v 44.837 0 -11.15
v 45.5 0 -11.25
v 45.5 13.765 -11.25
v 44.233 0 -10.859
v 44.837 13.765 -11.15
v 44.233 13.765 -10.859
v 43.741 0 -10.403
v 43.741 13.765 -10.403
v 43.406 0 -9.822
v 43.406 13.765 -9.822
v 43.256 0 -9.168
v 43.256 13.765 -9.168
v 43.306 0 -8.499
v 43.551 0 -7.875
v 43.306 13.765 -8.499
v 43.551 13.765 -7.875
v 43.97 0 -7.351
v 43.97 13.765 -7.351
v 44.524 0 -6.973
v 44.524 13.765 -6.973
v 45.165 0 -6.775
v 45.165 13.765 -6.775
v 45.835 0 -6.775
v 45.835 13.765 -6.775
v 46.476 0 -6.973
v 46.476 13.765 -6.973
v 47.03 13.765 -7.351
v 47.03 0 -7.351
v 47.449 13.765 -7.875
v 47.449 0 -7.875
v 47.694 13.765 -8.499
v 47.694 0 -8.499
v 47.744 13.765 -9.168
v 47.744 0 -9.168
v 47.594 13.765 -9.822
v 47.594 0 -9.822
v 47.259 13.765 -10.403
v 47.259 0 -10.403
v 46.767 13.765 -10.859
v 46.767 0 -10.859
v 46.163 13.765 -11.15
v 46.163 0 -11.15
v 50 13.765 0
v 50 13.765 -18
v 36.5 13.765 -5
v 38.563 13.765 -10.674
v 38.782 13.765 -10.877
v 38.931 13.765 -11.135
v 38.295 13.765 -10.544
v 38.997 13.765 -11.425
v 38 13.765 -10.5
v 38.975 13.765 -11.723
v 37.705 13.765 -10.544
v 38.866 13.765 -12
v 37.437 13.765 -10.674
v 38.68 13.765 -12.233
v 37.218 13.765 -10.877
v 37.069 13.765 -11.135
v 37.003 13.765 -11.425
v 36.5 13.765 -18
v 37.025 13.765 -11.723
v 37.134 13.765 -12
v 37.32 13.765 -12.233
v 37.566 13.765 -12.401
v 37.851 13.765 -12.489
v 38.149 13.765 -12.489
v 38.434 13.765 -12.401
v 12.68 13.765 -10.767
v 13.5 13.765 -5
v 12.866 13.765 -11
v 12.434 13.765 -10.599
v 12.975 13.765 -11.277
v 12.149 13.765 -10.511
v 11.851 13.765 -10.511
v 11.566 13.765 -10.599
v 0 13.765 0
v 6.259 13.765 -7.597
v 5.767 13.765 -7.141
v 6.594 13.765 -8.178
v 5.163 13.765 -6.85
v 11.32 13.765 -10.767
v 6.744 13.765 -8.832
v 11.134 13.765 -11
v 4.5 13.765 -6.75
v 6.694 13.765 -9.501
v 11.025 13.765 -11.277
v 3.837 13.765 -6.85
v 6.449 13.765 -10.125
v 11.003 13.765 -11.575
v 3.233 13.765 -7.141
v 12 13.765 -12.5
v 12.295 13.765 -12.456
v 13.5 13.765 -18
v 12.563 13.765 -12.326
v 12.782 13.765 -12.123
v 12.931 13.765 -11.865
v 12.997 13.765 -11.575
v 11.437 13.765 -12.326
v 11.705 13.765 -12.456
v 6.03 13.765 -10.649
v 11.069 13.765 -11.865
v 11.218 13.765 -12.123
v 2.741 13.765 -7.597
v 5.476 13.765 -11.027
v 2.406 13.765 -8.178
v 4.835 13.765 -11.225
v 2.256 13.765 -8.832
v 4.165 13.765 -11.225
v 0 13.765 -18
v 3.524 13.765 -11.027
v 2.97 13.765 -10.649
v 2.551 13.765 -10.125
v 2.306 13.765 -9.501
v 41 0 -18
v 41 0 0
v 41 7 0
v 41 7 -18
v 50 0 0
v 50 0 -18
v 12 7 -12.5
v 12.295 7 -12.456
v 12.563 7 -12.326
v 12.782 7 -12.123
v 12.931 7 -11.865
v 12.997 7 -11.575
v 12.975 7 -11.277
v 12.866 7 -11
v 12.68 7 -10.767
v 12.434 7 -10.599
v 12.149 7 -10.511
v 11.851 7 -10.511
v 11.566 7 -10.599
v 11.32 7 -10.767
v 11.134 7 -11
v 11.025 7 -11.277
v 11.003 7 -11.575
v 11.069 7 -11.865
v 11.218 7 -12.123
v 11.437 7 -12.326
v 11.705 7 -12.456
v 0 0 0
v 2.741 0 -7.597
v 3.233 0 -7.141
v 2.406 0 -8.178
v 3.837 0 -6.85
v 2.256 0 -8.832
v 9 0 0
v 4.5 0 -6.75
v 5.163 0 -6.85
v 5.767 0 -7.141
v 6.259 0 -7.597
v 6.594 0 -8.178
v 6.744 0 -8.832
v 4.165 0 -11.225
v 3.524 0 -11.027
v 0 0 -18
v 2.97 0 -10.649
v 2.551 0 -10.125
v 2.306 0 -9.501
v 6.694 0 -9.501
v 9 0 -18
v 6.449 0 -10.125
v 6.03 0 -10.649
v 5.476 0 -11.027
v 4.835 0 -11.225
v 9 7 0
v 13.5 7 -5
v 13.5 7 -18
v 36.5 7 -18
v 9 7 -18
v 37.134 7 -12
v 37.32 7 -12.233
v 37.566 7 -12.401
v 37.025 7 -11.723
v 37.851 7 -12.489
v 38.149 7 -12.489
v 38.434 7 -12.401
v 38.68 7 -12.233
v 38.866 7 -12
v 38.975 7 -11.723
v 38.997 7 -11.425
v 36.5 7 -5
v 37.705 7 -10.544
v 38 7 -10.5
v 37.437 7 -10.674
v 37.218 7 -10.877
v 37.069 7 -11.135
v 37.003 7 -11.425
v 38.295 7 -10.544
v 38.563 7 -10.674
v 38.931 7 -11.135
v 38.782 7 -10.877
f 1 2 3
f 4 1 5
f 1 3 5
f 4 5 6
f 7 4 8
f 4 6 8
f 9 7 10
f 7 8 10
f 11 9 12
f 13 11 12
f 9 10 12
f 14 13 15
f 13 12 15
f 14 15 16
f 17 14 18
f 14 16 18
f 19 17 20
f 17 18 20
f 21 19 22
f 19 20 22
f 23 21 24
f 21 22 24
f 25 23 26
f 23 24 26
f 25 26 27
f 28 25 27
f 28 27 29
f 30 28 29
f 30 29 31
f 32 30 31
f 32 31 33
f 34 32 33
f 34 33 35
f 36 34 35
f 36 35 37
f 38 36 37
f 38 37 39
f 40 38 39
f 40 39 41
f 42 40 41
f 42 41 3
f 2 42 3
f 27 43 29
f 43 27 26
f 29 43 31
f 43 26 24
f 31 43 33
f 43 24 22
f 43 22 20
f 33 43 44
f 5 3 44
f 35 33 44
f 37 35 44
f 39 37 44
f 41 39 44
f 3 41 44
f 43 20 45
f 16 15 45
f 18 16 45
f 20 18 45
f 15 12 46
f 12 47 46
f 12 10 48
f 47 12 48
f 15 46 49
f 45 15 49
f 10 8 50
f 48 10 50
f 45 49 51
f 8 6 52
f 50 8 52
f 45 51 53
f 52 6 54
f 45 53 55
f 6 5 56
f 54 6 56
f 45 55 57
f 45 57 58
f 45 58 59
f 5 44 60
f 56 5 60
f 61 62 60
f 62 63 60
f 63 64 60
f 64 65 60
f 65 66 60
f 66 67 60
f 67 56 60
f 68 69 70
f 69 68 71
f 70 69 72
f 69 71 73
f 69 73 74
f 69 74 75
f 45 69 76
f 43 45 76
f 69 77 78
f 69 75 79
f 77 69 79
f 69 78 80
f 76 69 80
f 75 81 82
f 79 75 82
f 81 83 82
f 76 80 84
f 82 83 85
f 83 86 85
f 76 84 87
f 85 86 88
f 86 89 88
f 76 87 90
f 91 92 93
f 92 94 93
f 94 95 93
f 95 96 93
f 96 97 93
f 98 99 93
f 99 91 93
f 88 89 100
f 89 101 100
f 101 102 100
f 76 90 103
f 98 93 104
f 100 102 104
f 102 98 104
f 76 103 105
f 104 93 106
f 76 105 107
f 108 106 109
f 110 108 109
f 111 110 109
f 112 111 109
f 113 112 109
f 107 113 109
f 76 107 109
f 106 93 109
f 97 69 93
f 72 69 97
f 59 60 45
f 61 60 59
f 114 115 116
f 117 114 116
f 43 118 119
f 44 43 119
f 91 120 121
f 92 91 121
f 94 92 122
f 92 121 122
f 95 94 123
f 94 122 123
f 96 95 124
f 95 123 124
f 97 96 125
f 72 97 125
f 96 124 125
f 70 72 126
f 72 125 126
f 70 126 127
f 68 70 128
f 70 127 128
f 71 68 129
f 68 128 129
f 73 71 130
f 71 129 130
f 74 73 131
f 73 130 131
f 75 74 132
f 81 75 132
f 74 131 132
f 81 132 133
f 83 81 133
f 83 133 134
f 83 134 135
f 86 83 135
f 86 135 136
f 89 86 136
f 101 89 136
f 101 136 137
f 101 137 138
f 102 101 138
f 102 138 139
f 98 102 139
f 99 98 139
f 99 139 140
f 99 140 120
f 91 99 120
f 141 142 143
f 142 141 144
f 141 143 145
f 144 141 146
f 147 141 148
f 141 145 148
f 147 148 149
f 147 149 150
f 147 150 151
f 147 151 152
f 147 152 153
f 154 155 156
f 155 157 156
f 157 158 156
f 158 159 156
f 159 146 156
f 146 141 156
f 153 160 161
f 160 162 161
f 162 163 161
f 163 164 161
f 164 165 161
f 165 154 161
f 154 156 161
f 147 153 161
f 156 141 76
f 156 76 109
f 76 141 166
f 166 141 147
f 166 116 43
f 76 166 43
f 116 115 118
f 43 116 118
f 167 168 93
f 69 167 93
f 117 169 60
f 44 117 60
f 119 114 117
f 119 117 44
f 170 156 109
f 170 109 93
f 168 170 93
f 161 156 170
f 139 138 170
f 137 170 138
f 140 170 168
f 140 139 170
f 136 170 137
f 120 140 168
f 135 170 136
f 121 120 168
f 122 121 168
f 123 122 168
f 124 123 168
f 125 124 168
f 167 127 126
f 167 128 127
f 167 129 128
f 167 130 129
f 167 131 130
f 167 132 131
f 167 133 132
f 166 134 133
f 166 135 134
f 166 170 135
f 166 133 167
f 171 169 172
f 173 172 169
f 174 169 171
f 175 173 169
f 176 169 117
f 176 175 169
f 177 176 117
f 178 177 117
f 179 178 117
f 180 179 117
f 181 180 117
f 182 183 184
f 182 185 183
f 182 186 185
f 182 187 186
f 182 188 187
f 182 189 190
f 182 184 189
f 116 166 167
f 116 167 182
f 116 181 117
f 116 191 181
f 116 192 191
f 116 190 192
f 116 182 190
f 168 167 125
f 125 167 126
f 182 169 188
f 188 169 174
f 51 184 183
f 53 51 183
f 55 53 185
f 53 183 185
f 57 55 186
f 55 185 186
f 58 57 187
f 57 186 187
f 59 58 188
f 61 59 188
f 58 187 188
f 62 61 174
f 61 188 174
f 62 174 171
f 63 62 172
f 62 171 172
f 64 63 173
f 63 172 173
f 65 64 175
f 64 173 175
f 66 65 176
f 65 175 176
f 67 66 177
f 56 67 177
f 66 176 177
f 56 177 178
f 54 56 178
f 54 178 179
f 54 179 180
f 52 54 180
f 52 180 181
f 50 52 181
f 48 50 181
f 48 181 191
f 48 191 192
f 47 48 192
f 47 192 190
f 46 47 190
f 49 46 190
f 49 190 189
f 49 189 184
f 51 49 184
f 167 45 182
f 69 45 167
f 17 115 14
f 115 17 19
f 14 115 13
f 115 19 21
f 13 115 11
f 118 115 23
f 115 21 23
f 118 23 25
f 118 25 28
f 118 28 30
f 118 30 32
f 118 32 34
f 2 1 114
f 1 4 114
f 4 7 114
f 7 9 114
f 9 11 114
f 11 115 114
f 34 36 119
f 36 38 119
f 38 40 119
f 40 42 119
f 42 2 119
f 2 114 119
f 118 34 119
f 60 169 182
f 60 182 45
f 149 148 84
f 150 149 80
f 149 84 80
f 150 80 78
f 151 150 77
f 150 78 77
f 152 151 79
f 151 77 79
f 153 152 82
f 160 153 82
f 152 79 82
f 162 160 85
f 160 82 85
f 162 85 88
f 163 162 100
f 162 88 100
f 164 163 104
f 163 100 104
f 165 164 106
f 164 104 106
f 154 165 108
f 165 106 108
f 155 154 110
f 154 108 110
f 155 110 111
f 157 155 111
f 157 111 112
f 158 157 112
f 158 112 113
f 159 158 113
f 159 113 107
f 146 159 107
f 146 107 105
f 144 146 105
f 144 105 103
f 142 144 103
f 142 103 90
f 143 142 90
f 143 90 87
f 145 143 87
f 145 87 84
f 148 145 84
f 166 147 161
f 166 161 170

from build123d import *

# Parameters (mm, degrees)
SKETCH1_W           = 50
SKETCH1_H           = 18
BOSS_EXTRUDE2_DEPTH = 22
SKETCH4_W           = 32
SKETCH4_H           = 14
CUT_EXTRUDE1_DEPTH  = 58.515215378
SKETCH5_W           = 23
SKETCH5_H           = 18
CUT_EXTRUDE3_DEPTH  = 13
SKETCH7_W           = 50
SKETCH7_H           = 8.235017036
CUT_EXTRUDE4_DEPTH  = 58.515215378
SKETCH9_R           = 1
CUT_EXTRUDE6_DEPTH  = 54.600373133
SKETCH10_R          = 2.25
CUT_EXTRUDE7_DEPTH  = 55.895125066


with BuildPart() as part:
    # Sketch1 → Boss-Extrude2 (new body)
    with BuildSketch(Plane(origin=(0, 0, 0), x_dir=(1, 0, 0), z_dir=(0, 1, 0))):
        with Locations((25, 9)):
            Rectangle(SKETCH1_W, SKETCH1_H)
    extrude(amount=BOSS_EXTRUDE2_DEPTH)

    # Sketch4 → Cut-Extrude1 (cut, through all)
    with BuildSketch(Plane.XY):
        with Locations((25, 0)):
            Rectangle(SKETCH4_W, SKETCH4_H)
    extrude(amount=-CUT_EXTRUDE1_DEPTH, mode=Mode.SUBTRACT)

    # Sketch5 → Cut-Extrude3 (cut)
    with BuildSketch(Plane(origin=(0, 0, -18), x_dir=(-1, 0, 0), z_dir=(0, 0, -1))):
        with Locations((-25, 7)):
            Rectangle(SKETCH5_W, SKETCH5_H)
    extrude(amount=-CUT_EXTRUDE3_DEPTH, mode=Mode.SUBTRACT)

    # Sketch7 → Cut-Extrude4 (cut, through all)
    with BuildSketch(Plane(origin=(0, 0, -18), x_dir=(-1, 0, 0), z_dir=(0, 0, -1))):
        with Locations((-25, 17.882491482)):
            Rectangle(SKETCH7_W, SKETCH7_H)
    extrude(amount=-CUT_EXTRUDE4_DEPTH, mode=Mode.SUBTRACT)

    # Sketch9 → Cut-Extrude6 (cut, through all)
    with BuildSketch(Plane.XZ.offset(-7)):
        with Locations(Location((12, -11.5, 0), (0, 0, 270))):
            Circle(SKETCH9_R)
        with Locations(Location((38, -11.5, 0), (0, 0, 90))):
            Circle(SKETCH9_R)
    extrude(amount=-CUT_EXTRUDE6_DEPTH, mode=Mode.SUBTRACT)

    # Sketch10 → Cut-Extrude7 (cut, through all)
    with BuildSketch(Plane(origin=(0, 13.764982964, 0), x_dir=(1, 0, 0), z_dir=(0, 1, 0))):
        with Locations(Location((4.5, 9, 0), (0, 0, 270))):
            Circle(SKETCH10_R)
        with Locations(Location((45.5, 9, 0), (0, 0, 90))):
            Circle(SKETCH10_R)
    extrude(amount=-CUT_EXTRUDE7_DEPTH, mode=Mode.SUBTRACT)


solid = part.part
